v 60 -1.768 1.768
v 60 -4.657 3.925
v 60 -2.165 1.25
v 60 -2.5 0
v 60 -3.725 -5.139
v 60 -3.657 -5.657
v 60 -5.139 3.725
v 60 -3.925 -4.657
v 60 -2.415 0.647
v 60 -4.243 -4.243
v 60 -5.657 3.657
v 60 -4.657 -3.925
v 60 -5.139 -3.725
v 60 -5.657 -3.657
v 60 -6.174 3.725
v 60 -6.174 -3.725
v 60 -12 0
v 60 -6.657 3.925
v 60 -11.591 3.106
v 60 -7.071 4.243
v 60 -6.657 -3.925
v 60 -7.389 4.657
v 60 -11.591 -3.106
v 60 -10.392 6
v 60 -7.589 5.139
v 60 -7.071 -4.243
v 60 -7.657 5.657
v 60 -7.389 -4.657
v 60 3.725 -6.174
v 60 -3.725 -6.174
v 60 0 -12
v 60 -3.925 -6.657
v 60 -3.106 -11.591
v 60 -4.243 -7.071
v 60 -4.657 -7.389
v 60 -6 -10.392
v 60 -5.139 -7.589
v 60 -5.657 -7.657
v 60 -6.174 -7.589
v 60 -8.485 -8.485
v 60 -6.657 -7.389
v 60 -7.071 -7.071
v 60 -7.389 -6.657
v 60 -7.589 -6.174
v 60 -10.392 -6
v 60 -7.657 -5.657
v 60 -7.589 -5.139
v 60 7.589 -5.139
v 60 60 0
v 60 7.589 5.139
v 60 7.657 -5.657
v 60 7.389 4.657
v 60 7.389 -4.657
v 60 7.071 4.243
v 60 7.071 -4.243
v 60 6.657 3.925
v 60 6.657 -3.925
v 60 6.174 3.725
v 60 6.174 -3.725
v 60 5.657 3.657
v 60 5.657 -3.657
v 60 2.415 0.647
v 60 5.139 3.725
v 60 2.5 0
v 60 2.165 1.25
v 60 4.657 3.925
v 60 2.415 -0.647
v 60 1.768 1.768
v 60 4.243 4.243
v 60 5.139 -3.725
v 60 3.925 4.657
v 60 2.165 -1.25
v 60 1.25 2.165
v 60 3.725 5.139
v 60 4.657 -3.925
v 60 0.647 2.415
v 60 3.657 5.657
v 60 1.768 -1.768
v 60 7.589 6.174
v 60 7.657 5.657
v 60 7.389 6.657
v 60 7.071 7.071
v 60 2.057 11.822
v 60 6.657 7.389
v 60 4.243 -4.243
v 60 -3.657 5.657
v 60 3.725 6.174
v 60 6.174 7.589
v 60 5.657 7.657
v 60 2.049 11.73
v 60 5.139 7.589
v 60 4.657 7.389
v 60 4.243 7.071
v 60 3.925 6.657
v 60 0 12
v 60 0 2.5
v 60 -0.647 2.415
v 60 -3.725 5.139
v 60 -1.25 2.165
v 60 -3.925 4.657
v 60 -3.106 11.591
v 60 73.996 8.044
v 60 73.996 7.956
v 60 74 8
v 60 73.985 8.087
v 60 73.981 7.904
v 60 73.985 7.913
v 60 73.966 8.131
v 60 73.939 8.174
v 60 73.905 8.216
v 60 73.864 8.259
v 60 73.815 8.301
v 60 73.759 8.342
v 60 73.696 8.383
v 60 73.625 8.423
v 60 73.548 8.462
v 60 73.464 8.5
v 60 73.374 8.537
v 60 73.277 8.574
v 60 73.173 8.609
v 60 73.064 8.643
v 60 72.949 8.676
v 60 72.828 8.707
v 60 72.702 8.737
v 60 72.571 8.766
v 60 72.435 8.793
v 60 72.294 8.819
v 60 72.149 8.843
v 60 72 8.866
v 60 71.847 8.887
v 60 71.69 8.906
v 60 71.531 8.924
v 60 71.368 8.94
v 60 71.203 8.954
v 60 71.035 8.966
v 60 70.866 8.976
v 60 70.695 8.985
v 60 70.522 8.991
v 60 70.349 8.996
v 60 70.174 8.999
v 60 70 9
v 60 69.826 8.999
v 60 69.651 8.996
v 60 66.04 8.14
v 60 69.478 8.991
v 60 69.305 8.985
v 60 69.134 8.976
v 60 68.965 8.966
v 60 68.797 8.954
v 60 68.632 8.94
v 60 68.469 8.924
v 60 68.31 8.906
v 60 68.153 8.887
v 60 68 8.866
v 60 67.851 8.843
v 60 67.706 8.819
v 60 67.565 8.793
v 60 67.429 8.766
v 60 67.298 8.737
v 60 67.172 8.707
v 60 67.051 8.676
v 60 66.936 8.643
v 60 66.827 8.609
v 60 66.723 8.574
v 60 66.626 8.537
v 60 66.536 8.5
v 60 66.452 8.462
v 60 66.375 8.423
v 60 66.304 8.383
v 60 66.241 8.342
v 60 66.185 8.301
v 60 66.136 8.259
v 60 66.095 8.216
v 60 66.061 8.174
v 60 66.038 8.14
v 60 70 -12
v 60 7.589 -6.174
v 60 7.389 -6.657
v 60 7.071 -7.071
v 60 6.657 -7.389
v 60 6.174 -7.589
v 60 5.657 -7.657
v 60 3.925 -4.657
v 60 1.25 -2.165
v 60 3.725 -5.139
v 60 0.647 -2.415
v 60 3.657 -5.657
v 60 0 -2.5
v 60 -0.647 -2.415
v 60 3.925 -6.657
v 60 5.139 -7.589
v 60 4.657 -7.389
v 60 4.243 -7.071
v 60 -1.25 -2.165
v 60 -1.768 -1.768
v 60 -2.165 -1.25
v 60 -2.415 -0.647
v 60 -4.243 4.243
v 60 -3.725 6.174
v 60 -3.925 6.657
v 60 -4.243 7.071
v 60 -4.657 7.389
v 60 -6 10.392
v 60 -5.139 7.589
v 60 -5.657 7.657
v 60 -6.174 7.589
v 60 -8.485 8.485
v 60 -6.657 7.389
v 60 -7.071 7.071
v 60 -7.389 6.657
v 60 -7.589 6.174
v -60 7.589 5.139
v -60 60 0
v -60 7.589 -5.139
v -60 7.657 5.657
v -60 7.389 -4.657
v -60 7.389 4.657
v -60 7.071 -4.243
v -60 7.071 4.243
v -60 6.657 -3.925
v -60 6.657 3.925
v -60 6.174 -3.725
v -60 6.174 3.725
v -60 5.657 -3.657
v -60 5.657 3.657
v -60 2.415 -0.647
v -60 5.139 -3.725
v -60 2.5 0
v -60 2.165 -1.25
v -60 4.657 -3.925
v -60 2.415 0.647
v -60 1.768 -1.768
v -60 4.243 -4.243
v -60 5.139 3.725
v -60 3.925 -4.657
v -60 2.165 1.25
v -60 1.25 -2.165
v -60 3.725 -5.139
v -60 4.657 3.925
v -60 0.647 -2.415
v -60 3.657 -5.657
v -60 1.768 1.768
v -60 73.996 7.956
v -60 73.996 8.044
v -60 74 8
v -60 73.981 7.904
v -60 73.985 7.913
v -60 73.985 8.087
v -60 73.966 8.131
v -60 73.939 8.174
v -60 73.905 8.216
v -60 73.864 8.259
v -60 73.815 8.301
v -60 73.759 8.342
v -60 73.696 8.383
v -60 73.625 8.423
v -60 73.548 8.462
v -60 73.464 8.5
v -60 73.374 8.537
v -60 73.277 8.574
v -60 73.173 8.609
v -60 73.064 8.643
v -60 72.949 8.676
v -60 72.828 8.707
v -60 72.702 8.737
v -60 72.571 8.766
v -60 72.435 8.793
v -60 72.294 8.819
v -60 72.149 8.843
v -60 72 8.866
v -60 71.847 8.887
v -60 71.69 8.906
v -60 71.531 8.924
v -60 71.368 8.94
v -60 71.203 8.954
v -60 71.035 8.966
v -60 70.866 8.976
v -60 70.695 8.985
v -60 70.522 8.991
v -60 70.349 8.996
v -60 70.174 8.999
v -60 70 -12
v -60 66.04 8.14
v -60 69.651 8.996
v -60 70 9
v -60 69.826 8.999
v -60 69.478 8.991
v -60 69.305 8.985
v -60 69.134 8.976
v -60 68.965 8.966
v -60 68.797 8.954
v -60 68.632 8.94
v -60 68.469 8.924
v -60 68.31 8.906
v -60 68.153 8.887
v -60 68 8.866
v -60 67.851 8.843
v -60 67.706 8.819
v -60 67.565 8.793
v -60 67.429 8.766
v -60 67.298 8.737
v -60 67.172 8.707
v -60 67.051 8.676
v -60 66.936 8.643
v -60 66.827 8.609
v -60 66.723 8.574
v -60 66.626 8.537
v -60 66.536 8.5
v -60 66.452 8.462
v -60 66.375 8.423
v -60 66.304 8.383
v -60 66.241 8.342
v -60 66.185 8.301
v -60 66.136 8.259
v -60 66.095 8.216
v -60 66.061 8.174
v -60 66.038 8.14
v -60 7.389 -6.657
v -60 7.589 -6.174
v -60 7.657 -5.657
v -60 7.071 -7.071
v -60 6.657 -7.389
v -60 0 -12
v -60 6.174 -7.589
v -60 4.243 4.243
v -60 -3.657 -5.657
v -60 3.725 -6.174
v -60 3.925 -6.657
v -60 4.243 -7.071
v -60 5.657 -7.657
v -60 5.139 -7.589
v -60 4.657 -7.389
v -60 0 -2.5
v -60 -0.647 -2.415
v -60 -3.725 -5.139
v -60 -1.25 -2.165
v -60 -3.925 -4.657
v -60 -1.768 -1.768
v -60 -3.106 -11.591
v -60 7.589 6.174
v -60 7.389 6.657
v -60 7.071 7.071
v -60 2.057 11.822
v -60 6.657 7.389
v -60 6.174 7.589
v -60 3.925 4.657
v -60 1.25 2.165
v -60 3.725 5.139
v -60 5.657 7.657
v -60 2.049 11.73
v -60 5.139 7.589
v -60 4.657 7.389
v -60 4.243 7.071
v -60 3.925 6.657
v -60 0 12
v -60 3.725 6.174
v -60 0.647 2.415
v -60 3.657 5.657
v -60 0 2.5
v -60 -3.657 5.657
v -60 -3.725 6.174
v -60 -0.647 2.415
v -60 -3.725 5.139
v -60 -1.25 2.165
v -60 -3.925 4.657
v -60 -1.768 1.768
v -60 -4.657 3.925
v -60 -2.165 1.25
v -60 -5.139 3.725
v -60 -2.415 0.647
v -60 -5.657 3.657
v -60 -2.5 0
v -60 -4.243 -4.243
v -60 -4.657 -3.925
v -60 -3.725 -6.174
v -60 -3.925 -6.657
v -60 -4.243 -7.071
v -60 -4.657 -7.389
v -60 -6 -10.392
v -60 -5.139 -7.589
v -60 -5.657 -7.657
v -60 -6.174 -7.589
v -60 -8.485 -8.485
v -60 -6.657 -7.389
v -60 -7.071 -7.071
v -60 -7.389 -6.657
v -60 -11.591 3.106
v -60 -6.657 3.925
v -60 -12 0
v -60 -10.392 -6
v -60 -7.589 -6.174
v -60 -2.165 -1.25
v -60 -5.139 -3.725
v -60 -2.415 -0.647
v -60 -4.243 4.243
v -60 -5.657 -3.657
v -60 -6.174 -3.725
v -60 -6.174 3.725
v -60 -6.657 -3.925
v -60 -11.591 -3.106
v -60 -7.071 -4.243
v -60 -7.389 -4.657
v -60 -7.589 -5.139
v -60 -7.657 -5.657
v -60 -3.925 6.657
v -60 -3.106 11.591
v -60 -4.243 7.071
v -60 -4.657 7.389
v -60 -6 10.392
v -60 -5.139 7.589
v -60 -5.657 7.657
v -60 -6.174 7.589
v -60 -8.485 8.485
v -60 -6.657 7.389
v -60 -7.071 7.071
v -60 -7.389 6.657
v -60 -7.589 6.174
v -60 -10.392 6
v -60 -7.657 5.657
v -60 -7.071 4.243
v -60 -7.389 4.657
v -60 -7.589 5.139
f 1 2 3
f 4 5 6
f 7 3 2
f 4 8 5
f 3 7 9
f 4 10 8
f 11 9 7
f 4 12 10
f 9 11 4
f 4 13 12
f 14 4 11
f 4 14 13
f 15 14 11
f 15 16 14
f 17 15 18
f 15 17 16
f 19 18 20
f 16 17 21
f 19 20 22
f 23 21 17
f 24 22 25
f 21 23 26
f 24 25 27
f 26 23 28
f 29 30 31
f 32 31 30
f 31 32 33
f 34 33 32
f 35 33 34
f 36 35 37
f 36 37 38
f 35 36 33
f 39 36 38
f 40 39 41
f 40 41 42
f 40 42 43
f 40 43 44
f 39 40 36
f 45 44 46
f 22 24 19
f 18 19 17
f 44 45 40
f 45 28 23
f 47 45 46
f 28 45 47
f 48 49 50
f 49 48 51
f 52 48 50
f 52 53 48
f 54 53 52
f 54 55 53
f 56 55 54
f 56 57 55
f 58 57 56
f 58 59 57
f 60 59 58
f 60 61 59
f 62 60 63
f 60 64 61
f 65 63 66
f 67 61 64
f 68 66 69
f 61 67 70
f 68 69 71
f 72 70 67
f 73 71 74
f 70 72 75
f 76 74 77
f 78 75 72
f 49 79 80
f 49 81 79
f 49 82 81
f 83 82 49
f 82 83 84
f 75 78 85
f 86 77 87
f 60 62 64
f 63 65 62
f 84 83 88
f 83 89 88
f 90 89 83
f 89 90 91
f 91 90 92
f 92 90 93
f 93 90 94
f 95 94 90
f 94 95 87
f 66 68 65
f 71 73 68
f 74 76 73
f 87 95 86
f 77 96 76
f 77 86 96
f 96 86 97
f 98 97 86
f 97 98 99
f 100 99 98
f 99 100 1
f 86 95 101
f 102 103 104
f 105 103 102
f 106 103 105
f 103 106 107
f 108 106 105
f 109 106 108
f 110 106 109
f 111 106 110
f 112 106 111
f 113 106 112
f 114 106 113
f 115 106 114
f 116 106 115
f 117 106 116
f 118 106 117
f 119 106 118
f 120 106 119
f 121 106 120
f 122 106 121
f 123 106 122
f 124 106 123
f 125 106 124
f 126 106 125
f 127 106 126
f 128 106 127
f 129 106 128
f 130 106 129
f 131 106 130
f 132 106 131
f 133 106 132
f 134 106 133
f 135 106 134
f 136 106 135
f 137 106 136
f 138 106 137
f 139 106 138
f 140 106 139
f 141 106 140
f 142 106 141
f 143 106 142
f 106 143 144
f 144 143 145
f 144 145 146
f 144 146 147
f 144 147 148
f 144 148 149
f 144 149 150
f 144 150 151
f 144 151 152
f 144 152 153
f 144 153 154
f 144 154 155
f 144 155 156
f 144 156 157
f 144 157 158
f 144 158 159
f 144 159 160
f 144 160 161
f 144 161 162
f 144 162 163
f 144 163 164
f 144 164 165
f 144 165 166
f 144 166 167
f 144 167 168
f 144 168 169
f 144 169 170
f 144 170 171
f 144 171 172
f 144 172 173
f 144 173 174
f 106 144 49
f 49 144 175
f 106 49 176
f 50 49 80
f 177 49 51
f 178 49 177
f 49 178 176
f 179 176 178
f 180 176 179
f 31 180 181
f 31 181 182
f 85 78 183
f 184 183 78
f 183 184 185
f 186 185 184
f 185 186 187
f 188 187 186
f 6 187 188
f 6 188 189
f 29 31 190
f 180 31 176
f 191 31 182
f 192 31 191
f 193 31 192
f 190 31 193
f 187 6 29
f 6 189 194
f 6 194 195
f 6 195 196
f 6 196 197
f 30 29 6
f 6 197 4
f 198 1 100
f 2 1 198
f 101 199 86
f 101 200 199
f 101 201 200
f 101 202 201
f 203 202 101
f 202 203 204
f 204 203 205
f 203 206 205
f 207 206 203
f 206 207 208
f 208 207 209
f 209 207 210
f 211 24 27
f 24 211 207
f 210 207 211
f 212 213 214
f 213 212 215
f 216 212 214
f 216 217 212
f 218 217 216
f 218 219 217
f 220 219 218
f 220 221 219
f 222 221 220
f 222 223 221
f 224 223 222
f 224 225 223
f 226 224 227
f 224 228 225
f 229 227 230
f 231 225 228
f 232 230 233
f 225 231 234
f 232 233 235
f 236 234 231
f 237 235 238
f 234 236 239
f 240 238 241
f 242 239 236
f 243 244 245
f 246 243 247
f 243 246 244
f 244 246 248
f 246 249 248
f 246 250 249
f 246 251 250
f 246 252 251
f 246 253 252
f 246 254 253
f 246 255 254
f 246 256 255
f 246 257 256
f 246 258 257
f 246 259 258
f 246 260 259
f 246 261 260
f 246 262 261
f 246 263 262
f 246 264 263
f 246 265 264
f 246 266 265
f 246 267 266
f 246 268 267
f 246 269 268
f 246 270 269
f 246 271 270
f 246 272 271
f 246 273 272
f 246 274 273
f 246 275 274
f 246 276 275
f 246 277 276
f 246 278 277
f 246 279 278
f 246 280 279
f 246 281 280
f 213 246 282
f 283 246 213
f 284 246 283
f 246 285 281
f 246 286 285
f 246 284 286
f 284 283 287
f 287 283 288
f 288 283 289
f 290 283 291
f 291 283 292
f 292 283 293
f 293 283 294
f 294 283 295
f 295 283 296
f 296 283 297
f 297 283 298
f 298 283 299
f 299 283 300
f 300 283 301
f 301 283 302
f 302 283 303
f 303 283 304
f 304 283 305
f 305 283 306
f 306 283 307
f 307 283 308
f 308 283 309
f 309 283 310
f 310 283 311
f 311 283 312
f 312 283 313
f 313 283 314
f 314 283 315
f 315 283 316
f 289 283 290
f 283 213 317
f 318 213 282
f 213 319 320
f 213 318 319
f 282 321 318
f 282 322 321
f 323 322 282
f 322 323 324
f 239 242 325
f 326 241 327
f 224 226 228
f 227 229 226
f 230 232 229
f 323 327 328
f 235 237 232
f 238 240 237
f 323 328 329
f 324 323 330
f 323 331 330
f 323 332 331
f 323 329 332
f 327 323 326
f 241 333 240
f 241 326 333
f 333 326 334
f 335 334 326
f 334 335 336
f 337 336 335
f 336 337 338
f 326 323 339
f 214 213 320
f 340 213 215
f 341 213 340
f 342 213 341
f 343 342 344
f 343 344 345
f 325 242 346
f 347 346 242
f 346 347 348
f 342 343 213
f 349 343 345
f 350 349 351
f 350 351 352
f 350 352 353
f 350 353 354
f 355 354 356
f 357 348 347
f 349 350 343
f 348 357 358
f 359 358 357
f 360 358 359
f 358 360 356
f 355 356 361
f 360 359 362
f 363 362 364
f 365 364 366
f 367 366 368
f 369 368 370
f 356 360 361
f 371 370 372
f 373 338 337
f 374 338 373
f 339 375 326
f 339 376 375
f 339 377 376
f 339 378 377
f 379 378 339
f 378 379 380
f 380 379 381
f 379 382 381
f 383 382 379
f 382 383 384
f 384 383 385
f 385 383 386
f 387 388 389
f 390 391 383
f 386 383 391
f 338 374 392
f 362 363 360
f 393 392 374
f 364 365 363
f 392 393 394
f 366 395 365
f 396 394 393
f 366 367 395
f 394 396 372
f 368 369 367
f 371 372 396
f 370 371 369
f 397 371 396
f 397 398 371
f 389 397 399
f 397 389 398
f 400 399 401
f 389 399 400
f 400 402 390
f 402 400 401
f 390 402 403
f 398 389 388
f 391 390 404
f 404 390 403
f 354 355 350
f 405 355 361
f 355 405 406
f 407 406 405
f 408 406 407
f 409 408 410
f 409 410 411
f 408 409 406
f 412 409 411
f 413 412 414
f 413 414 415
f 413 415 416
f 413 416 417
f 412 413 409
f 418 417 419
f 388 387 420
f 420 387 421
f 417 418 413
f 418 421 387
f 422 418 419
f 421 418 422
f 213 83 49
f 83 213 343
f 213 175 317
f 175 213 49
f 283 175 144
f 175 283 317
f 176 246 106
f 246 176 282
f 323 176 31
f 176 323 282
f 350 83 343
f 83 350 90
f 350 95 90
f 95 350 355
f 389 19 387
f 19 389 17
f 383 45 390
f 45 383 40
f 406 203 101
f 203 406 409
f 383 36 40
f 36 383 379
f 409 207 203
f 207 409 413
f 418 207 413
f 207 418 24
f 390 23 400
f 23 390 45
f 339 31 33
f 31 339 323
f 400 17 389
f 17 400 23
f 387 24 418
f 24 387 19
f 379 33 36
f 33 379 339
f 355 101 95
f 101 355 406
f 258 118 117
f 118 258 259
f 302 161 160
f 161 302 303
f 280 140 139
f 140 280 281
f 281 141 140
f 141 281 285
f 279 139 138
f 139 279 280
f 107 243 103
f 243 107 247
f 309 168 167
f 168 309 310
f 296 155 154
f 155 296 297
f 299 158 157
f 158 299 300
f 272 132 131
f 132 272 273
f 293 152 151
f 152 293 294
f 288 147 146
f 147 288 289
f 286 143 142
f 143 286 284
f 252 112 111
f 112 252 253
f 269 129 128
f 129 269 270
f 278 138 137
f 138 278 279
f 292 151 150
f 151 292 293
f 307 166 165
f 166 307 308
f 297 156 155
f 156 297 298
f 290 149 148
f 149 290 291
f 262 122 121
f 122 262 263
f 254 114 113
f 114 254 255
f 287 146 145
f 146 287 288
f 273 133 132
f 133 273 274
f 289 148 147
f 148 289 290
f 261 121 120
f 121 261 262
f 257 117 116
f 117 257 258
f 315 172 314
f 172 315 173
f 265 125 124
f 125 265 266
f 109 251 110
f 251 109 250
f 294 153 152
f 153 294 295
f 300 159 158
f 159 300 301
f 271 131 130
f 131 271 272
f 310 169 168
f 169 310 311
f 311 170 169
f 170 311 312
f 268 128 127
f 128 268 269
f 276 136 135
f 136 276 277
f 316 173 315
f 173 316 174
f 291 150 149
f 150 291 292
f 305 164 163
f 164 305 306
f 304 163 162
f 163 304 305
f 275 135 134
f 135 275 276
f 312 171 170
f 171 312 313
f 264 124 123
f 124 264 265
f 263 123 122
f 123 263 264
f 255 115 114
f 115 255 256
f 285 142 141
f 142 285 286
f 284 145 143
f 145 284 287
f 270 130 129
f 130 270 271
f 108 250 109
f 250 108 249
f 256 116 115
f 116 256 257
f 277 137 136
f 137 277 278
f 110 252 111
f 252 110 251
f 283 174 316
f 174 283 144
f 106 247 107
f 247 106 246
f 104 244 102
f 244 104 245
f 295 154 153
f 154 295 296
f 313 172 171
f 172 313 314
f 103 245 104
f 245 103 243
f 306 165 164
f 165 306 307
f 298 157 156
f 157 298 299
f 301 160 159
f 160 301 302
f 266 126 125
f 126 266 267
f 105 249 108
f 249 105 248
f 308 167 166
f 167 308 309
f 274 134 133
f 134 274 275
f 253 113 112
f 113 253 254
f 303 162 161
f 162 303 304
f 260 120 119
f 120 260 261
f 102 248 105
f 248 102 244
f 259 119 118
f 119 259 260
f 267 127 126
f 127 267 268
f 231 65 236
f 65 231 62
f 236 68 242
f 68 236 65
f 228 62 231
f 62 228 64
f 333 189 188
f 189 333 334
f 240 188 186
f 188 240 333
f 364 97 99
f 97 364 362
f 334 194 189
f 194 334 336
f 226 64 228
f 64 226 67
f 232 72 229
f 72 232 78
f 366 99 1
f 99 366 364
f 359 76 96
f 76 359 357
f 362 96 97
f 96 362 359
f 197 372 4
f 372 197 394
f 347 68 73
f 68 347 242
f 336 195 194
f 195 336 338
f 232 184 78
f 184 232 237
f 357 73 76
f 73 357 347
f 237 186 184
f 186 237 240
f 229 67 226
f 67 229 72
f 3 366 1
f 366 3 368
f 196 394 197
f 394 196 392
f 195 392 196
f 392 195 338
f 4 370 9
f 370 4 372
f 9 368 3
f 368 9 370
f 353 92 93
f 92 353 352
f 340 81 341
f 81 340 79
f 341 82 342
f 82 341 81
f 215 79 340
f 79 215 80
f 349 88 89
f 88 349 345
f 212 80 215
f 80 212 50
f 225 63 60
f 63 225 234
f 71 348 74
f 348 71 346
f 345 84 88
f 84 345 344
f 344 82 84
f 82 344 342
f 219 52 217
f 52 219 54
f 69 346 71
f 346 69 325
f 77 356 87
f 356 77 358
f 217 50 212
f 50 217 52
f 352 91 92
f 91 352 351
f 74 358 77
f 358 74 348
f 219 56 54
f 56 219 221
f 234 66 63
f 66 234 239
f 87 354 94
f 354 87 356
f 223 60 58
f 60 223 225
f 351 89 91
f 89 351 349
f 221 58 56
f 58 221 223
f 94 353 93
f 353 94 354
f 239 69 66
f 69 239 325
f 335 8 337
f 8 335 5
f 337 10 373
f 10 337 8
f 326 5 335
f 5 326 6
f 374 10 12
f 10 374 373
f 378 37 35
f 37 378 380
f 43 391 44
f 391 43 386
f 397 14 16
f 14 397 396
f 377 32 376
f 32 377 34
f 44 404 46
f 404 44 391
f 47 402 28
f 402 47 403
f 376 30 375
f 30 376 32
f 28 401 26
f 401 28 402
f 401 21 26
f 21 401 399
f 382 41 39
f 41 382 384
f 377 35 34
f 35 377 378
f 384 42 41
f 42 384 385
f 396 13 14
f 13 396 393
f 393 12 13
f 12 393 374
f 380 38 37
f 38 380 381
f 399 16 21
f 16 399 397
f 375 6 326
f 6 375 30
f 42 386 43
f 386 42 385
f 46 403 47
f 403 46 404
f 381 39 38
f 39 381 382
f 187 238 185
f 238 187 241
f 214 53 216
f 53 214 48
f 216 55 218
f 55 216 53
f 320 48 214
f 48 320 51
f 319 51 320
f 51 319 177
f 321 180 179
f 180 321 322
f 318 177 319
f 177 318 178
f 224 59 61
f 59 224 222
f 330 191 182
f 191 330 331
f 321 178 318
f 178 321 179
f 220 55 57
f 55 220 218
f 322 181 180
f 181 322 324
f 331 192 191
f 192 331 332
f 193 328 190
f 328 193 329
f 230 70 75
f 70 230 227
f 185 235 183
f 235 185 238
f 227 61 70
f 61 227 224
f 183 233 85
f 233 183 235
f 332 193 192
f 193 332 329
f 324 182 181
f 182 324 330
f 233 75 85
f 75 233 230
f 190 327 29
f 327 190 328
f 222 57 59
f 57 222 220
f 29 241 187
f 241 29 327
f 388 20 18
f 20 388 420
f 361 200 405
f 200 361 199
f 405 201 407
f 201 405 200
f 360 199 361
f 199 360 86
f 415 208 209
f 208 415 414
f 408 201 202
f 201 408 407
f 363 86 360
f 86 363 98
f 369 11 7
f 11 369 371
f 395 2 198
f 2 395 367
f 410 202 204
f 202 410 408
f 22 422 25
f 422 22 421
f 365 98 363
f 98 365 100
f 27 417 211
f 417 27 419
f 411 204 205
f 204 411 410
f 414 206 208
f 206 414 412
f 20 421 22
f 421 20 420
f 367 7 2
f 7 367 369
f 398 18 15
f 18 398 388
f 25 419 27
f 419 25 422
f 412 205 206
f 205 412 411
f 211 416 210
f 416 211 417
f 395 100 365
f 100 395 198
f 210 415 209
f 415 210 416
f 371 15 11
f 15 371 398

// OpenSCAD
gripperLength=70;
gripperThickness = 120;
guideDepth=24;
gripperDepth=20;

gripperMax=4;
gripperMin=-4;

gripperBase= 10;

gripperY = guideDepth*guideDepth/(4*gripperLength);
gripperX = sqrt(guideDepth*guideDepth/4 - gripperY*gripperY);


holePadding = 2;
holeDepth = 128;
holeOffset = 8;
holeRadius = 2;
bigHoleRadius=2.5;


holeFacets = 24;


 
GripperOutline();


module GripperOutline() {
    rotate([0,-90,0])
    difference() {
        union() {
            translate([0,0,-gripperThickness/2]) {
                linear_extrude(height=gripperThickness)
                    polygon(points=[[-guideDepth/2,0],
                                    [-guideDepth/2,gripperLength],
                                    [-guideDepth/2+gripperDepth,gripperLength+gripperMax],
                                    [-guideDepth/2+gripperDepth+0.14,
                                     gripperLength+gripperMin+0.038],
                                    [0, gripperLength-gripperBase],
                                    [gripperX,gripperY]]);               

                
                cylinder(r=guideDepth/2,h=gripperThickness,$fn=holeFacets);
                translate([-guideDepth/2+gripperDepth+0,gripperLength,0])
                    scale([0.25,1,1])
                        cylinder(r=(gripperMax-gripperMin)/2,h=gripperThickness, $fn=144);
            }
        }
        rotate([0,0,45])
            Holes();
    }
}

module Guide() {
    
}


module Holes() {
    cylinder(r=bigHoleRadius,h=holeDepth,
             center=true, $fn=holeFacets);
    translate([holeOffset,0,0])
        cylinder(r=holeRadius,h=holeDepth,
                 center=true, $fn=holeFacets);
    translate([-holeOffset,0,0])
        cylinder(r=holeRadius,h=holeDepth,
                 center=true, $fn=holeFacets);
    translate([0,holeOffset,0])
        cylinder(r=holeRadius,h=holeDepth,
                 center=true, $fn=holeFacets);
    translate([0,-holeOffset,0])
        cylinder(r=holeRadius,h=holeDepth,
                 center=true, $fn=holeFacets);
}
